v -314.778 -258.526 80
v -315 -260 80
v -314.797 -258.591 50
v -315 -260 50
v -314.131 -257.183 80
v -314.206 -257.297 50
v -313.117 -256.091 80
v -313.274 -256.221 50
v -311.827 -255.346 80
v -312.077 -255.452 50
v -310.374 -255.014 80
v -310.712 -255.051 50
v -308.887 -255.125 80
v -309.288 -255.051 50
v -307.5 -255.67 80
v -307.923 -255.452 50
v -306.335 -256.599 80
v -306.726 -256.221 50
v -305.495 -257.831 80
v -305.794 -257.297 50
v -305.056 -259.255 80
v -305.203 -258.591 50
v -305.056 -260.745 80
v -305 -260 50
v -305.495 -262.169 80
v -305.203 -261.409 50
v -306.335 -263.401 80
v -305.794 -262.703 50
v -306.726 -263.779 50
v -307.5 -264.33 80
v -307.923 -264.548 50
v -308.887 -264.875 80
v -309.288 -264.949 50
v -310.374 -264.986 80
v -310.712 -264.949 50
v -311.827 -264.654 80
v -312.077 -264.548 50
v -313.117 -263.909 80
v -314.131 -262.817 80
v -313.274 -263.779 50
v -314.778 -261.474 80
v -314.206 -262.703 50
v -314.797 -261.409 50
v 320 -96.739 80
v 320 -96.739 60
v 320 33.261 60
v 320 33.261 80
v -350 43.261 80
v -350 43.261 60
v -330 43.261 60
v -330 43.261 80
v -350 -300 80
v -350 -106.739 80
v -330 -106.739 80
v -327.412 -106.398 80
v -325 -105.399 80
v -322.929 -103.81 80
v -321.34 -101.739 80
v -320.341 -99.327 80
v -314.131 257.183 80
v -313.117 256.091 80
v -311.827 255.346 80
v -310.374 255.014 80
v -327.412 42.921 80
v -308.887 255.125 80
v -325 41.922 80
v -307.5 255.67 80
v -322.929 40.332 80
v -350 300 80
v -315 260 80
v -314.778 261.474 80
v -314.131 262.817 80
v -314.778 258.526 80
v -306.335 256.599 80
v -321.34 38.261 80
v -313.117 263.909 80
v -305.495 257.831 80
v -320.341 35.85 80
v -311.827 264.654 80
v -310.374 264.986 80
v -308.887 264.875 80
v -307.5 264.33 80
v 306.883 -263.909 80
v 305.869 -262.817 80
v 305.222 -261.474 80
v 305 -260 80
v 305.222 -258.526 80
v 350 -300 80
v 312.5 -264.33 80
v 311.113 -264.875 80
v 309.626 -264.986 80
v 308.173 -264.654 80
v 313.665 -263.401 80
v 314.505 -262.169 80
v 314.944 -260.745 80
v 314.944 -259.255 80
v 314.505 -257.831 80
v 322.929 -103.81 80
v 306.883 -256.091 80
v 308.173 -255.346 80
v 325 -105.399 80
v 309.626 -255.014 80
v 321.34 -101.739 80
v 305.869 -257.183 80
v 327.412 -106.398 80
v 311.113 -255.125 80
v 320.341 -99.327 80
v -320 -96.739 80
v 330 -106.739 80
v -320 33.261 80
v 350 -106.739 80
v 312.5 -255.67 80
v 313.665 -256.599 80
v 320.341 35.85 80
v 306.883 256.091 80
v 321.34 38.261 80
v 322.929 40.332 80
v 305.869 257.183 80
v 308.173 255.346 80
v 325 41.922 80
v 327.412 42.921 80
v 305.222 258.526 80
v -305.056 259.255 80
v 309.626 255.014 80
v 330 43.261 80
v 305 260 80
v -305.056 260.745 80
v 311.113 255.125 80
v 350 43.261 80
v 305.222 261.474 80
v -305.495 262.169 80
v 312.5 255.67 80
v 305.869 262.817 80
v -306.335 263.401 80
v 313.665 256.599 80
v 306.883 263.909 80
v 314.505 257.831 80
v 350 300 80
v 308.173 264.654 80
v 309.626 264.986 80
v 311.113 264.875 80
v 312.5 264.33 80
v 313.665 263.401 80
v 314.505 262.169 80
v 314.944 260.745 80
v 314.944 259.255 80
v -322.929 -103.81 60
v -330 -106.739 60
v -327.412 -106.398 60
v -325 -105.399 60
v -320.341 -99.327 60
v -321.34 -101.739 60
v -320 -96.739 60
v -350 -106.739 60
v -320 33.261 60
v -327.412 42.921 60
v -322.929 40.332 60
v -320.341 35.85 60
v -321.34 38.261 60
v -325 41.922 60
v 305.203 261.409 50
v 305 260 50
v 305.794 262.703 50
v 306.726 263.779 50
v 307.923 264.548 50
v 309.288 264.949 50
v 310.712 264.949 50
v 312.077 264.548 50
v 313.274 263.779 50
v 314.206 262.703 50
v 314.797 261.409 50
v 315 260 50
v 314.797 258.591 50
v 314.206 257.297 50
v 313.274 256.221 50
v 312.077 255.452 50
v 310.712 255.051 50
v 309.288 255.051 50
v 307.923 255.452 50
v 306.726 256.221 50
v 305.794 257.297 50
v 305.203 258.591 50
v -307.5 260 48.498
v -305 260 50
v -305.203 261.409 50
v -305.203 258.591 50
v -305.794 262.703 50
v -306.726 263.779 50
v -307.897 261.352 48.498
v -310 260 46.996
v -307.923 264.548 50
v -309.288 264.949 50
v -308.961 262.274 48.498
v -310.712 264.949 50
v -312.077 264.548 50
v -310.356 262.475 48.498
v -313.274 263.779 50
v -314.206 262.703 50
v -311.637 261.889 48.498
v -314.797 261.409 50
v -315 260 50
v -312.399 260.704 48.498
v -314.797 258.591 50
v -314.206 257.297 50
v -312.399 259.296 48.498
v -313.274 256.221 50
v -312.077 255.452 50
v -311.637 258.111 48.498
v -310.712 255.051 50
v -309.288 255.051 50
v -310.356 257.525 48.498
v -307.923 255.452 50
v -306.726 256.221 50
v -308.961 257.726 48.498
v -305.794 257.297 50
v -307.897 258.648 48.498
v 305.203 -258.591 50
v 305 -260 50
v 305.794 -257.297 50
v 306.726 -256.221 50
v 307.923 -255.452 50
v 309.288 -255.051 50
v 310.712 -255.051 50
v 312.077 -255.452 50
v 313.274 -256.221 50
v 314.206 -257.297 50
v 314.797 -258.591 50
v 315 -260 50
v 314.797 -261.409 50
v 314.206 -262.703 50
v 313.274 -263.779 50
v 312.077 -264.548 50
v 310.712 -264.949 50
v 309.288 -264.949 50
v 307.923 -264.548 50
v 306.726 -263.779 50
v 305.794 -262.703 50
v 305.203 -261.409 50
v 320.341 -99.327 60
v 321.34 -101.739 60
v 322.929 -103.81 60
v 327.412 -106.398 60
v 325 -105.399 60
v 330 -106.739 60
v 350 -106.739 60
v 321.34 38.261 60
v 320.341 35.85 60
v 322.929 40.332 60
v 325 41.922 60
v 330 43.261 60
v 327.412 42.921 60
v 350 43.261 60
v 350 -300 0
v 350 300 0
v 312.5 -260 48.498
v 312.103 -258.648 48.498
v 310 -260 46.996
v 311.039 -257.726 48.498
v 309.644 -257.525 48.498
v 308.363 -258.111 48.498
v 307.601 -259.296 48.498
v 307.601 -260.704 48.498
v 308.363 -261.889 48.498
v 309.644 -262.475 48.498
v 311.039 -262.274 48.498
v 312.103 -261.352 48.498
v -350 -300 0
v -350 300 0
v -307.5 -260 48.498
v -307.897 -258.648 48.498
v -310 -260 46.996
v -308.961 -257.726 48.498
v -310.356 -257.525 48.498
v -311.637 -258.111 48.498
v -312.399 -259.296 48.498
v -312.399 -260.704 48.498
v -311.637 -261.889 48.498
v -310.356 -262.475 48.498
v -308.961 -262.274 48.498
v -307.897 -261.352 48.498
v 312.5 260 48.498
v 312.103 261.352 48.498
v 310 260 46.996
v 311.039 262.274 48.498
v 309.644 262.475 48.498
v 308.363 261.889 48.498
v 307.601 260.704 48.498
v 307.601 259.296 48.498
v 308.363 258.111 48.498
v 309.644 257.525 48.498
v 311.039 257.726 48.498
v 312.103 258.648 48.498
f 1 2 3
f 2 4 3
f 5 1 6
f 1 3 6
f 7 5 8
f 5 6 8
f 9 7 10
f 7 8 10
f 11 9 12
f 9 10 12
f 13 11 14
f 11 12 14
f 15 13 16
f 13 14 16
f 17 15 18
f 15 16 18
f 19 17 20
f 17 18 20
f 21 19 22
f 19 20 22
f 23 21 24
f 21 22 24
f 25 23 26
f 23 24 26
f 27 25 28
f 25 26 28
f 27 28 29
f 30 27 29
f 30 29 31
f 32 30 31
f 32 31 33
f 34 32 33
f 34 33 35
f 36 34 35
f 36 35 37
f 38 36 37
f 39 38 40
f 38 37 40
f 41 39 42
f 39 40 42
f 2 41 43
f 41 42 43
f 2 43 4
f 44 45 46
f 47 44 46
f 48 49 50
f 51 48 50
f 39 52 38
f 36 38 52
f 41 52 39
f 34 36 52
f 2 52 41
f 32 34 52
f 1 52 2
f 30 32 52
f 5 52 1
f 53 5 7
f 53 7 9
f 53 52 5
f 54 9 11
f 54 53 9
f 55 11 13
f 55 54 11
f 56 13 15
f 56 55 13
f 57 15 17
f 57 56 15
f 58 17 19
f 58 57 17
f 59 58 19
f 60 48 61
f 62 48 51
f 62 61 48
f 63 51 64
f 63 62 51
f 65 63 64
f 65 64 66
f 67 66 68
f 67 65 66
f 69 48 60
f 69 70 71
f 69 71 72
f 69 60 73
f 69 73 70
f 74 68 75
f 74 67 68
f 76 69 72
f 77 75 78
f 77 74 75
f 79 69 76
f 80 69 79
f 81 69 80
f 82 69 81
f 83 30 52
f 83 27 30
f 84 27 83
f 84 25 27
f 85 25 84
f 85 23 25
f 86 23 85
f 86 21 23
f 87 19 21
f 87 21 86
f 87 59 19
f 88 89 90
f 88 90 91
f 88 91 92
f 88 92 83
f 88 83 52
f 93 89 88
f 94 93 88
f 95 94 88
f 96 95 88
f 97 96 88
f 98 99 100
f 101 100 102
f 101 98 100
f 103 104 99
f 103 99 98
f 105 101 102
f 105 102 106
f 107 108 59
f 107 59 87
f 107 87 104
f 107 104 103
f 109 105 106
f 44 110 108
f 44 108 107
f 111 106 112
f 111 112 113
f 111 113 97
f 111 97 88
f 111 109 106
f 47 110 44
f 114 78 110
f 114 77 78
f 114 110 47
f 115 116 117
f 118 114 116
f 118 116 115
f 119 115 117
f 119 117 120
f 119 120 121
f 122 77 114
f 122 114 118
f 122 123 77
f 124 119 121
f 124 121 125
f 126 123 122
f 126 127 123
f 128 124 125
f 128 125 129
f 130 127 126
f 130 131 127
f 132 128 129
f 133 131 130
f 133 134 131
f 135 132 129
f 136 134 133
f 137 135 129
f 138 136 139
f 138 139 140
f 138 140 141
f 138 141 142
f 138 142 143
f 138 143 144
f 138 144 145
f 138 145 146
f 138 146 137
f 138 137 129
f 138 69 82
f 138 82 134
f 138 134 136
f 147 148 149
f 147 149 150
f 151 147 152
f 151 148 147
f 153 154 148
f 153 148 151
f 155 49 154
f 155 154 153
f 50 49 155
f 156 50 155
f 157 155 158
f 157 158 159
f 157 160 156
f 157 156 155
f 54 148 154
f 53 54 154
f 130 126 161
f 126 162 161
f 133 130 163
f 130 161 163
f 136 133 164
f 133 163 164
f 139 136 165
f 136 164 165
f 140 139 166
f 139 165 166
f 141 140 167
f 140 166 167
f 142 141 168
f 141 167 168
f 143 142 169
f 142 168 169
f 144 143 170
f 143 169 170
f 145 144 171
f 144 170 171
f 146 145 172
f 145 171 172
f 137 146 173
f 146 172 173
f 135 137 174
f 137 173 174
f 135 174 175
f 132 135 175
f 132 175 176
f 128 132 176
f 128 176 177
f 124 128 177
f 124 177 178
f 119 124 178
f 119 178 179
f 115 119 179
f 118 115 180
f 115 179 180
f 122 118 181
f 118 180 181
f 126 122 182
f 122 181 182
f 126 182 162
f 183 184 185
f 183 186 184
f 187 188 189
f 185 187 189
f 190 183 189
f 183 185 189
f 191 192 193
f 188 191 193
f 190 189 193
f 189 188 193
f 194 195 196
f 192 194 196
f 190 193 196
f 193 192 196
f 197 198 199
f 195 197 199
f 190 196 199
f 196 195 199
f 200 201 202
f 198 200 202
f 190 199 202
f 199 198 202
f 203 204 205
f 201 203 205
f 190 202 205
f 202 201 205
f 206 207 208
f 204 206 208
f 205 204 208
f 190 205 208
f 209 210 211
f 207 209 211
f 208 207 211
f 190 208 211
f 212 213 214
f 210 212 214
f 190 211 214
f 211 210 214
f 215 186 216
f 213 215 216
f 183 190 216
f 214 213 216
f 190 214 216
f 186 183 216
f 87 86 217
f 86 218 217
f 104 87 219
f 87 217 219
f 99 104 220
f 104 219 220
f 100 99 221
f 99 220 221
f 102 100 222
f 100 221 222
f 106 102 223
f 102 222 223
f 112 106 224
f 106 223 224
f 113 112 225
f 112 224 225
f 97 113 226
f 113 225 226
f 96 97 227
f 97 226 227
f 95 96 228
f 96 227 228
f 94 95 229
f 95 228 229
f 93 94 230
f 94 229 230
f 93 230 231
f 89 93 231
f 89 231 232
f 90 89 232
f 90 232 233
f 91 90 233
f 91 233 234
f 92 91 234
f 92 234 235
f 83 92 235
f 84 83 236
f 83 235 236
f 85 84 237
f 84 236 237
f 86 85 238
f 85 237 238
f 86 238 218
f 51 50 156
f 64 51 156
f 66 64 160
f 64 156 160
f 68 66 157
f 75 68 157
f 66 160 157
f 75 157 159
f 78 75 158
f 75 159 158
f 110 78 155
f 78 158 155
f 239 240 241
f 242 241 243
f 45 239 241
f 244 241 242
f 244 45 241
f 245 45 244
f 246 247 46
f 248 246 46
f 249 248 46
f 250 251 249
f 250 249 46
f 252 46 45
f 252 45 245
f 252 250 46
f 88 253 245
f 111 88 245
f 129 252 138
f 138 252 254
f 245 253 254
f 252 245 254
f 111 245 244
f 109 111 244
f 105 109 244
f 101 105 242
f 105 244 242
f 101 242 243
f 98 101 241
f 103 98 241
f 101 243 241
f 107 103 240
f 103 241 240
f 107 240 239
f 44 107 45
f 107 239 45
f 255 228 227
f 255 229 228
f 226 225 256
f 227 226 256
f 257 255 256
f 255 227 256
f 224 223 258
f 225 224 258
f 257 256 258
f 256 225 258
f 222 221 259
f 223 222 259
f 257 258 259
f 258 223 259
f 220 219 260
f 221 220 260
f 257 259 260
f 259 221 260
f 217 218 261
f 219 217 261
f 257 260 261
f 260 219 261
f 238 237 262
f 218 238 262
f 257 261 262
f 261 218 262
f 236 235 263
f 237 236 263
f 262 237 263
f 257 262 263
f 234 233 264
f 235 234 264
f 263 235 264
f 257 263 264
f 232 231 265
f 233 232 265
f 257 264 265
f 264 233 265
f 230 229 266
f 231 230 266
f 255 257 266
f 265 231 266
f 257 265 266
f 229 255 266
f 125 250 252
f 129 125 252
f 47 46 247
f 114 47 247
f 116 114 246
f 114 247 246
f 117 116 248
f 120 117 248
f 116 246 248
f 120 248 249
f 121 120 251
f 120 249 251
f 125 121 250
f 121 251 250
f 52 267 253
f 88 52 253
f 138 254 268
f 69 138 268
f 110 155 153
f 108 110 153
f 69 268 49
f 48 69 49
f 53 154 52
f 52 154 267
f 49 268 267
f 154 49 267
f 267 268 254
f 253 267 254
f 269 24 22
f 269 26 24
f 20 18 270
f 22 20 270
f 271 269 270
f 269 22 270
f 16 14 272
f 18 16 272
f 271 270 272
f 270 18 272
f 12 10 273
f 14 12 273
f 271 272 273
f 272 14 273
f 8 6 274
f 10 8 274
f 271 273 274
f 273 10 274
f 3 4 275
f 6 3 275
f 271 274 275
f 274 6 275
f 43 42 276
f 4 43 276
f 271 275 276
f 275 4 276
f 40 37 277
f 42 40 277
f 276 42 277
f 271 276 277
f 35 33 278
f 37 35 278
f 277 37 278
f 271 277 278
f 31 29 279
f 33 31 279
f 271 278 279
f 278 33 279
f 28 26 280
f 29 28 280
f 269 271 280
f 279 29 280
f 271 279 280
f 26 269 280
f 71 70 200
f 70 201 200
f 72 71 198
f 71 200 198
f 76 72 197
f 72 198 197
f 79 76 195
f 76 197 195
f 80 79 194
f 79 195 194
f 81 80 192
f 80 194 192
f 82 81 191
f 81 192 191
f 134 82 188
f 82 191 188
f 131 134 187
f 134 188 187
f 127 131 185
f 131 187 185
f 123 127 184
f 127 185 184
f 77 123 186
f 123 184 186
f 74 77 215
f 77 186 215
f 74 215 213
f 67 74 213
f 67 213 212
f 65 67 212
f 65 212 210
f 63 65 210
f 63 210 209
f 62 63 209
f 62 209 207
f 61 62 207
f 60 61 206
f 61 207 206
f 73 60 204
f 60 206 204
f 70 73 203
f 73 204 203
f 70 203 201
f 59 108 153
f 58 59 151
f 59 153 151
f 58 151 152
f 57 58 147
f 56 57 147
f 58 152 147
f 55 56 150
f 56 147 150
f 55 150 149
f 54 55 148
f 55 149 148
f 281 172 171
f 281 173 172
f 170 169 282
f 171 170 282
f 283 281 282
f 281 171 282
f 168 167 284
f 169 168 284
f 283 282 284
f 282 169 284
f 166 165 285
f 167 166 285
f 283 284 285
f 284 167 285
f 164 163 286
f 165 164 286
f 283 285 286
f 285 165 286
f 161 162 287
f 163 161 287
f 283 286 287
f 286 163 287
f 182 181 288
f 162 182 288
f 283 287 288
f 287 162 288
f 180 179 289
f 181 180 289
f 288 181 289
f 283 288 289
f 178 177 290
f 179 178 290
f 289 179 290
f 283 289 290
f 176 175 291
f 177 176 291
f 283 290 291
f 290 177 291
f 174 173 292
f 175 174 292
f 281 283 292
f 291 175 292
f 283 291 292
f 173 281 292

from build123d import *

# Parameters (mm, degrees)
F1_DEPTH = 80
F2_DEPTH = 60
F4_D     = 10
F4_DEPTH = 30
F4_TIP   = 3.0043030951


with BuildPart() as f1:
    # F0 (on Top) → F1 (new body)
    with BuildSketch(Plane.XY):
        with BuildLine():
            Line((350, 43.2613432407), (350, 300))
            Line((350, 300), (-350, 300))
            Line((-350, 300), (-350, 43.2613432407))
            Line((-350, 43.2613432407), (-330, 43.2613432407))
            ThreePointArc((-330, 43.2613432407), (-322.9289321881, 40.3324110526), (-320, 33.2613432407))
            Line((-320, 33.2613432407), (-320, -96.7386567593))
            ThreePointArc((-320, -96.7386567593), (-322.9289321881, -103.8097245711), (-330, -106.7386567593))
            Line((-330, -106.7386567593), (-350, -106.7386567593))
            Line((-350, -106.7386567593), (-350, -300))
            Line((-350, -300), (350, -300))
            Line((350, -300), (350, -106.7386567593))
            Line((350, -106.7386567593), (330, -106.7386567593))
            ThreePointArc((330, -106.7386567593), (322.9289321881, -103.8097245711), (320, -96.7386567593))
            Line((320, -96.7386567593), (320, 33.2613432407))
            ThreePointArc((320, 33.2613432407), (322.9289321881, 40.3324110526), (330, 43.2613432407))
            Line((330, 43.2613432407), (350, 43.2613432407))
        make_face()
    extrude(amount=F1_DEPTH)

    # F0 (on Top) → F2 (join)
    with BuildSketch(Plane.XY):
        with BuildLine():
            Line((350, -106.7386567593), (350, 43.2613432407))
            Line((350, 43.2613432407), (330, 43.2613432407))
            ThreePointArc((330, 43.2613432407), (322.9289321881, 40.3324110526), (320, 33.2613432407))
            Line((320, 33.2613432407), (320, -96.7386567593))
            ThreePointArc((320, -96.7386567593), (322.9289321881, -103.8097245711), (330, -106.7386567593))
            Line((330, -106.7386567593), (350, -106.7386567593))
        make_face()
        with BuildLine():
            Line((-330, 43.2613432407), (-350, 43.2613432407))
            Line((-350, 43.2613432407), (-350, -106.7386567593))
            Line((-350, -106.7386567593), (-330, -106.7386567593))
            ThreePointArc((-330, -106.7386567593), (-322.9289321881, -103.8097245711), (-320, -96.7386567593))
            Line((-320, -96.7386567593), (-320, 33.2613432407))
            ThreePointArc((-320, 33.2613432407), (-322.9289321881, 40.3324110526), (-330, 43.2613432407))
        make_face()
    extrude(amount=F2_DEPTH)

    # F4
    with Locations(Plane.XY.offset(80)):
        with Locations((310, -260), (-310, -260), (310, 260), (-310, 260)):
            Hole(F4_D / 2, depth=F4_DEPTH)
            with Locations((0, 0, -(F4_DEPTH + F4_TIP / 2))):  # 118° drill point
                Cone(0, F4_D / 2, F4_TIP, mode=Mode.SUBTRACT)


solid = f1.part
